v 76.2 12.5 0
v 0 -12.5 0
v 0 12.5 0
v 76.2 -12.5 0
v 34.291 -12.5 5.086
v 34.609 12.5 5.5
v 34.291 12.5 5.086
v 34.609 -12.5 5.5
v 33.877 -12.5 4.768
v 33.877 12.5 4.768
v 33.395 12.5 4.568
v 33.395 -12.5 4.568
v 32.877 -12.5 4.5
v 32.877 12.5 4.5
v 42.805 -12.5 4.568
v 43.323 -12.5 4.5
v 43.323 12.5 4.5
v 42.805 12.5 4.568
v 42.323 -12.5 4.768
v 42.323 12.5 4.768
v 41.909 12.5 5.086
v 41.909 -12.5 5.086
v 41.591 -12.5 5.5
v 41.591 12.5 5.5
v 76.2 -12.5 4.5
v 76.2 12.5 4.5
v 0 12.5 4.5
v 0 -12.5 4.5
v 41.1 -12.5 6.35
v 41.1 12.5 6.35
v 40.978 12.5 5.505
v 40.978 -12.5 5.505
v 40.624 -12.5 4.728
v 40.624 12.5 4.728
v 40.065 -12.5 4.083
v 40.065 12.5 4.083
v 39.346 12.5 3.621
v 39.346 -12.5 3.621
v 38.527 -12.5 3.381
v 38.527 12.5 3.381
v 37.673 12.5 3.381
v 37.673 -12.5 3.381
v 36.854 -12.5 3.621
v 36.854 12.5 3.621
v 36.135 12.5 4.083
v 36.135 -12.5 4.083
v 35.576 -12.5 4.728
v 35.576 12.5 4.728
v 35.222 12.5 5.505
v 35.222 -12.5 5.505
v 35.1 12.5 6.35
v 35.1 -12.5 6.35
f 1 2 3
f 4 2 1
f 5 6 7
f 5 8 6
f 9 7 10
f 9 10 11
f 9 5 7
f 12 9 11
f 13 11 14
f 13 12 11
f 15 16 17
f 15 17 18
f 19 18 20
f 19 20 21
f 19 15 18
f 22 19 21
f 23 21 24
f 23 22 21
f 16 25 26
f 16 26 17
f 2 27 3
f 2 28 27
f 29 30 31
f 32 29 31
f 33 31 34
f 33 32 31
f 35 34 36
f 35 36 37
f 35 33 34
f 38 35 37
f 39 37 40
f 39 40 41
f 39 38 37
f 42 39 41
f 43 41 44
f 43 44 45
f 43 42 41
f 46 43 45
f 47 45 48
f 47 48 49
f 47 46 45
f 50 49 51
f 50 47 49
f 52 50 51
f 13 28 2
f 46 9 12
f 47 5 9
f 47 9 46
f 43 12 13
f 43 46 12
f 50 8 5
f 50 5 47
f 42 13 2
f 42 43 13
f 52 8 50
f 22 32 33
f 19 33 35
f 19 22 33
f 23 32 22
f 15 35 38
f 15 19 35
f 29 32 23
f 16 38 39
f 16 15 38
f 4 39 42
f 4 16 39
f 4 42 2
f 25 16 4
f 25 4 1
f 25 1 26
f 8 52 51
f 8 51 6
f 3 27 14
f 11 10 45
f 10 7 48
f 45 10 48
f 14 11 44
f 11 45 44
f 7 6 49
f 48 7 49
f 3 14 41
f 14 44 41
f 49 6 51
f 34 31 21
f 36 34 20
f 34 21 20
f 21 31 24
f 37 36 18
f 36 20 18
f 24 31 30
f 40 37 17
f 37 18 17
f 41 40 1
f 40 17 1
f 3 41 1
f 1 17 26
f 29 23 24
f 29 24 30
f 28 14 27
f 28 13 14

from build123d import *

# Parameters (mm, degrees)
F1_DEPTH = 12.5


with BuildPart() as f1:
    # F0 (on Front) → F1 (new body, symmetric)
    with BuildSketch(Plane.XZ):
        with BuildLine():
            Line((0, 4.5), (0, 0))
            Line((0, 0), (76.2, 0))
            Line((76.2, 0), (76.2, 4.5))
            Line((76.2, 4.5), (43.322799, 4.5))
            ThreePointArc((43.322799, 4.5), (42.322799, 4.767949), (41.590748, 5.5))
            Line((41.590748, 5.5), (41.1, 6.35))
            ThreePointArc((41.1, 6.35), (38.1, 3.35), (35.1, 6.35))
            Line((35.1, 6.35), (34.609252, 5.5))
            ThreePointArc((34.609252, 5.5), (33.877201, 4.767949), (32.877201, 4.5))
            Line((32.877201, 4.5), (0, 4.5))
        make_face()
    extrude(amount=F1_DEPTH, both=True)


solid = f1.part
